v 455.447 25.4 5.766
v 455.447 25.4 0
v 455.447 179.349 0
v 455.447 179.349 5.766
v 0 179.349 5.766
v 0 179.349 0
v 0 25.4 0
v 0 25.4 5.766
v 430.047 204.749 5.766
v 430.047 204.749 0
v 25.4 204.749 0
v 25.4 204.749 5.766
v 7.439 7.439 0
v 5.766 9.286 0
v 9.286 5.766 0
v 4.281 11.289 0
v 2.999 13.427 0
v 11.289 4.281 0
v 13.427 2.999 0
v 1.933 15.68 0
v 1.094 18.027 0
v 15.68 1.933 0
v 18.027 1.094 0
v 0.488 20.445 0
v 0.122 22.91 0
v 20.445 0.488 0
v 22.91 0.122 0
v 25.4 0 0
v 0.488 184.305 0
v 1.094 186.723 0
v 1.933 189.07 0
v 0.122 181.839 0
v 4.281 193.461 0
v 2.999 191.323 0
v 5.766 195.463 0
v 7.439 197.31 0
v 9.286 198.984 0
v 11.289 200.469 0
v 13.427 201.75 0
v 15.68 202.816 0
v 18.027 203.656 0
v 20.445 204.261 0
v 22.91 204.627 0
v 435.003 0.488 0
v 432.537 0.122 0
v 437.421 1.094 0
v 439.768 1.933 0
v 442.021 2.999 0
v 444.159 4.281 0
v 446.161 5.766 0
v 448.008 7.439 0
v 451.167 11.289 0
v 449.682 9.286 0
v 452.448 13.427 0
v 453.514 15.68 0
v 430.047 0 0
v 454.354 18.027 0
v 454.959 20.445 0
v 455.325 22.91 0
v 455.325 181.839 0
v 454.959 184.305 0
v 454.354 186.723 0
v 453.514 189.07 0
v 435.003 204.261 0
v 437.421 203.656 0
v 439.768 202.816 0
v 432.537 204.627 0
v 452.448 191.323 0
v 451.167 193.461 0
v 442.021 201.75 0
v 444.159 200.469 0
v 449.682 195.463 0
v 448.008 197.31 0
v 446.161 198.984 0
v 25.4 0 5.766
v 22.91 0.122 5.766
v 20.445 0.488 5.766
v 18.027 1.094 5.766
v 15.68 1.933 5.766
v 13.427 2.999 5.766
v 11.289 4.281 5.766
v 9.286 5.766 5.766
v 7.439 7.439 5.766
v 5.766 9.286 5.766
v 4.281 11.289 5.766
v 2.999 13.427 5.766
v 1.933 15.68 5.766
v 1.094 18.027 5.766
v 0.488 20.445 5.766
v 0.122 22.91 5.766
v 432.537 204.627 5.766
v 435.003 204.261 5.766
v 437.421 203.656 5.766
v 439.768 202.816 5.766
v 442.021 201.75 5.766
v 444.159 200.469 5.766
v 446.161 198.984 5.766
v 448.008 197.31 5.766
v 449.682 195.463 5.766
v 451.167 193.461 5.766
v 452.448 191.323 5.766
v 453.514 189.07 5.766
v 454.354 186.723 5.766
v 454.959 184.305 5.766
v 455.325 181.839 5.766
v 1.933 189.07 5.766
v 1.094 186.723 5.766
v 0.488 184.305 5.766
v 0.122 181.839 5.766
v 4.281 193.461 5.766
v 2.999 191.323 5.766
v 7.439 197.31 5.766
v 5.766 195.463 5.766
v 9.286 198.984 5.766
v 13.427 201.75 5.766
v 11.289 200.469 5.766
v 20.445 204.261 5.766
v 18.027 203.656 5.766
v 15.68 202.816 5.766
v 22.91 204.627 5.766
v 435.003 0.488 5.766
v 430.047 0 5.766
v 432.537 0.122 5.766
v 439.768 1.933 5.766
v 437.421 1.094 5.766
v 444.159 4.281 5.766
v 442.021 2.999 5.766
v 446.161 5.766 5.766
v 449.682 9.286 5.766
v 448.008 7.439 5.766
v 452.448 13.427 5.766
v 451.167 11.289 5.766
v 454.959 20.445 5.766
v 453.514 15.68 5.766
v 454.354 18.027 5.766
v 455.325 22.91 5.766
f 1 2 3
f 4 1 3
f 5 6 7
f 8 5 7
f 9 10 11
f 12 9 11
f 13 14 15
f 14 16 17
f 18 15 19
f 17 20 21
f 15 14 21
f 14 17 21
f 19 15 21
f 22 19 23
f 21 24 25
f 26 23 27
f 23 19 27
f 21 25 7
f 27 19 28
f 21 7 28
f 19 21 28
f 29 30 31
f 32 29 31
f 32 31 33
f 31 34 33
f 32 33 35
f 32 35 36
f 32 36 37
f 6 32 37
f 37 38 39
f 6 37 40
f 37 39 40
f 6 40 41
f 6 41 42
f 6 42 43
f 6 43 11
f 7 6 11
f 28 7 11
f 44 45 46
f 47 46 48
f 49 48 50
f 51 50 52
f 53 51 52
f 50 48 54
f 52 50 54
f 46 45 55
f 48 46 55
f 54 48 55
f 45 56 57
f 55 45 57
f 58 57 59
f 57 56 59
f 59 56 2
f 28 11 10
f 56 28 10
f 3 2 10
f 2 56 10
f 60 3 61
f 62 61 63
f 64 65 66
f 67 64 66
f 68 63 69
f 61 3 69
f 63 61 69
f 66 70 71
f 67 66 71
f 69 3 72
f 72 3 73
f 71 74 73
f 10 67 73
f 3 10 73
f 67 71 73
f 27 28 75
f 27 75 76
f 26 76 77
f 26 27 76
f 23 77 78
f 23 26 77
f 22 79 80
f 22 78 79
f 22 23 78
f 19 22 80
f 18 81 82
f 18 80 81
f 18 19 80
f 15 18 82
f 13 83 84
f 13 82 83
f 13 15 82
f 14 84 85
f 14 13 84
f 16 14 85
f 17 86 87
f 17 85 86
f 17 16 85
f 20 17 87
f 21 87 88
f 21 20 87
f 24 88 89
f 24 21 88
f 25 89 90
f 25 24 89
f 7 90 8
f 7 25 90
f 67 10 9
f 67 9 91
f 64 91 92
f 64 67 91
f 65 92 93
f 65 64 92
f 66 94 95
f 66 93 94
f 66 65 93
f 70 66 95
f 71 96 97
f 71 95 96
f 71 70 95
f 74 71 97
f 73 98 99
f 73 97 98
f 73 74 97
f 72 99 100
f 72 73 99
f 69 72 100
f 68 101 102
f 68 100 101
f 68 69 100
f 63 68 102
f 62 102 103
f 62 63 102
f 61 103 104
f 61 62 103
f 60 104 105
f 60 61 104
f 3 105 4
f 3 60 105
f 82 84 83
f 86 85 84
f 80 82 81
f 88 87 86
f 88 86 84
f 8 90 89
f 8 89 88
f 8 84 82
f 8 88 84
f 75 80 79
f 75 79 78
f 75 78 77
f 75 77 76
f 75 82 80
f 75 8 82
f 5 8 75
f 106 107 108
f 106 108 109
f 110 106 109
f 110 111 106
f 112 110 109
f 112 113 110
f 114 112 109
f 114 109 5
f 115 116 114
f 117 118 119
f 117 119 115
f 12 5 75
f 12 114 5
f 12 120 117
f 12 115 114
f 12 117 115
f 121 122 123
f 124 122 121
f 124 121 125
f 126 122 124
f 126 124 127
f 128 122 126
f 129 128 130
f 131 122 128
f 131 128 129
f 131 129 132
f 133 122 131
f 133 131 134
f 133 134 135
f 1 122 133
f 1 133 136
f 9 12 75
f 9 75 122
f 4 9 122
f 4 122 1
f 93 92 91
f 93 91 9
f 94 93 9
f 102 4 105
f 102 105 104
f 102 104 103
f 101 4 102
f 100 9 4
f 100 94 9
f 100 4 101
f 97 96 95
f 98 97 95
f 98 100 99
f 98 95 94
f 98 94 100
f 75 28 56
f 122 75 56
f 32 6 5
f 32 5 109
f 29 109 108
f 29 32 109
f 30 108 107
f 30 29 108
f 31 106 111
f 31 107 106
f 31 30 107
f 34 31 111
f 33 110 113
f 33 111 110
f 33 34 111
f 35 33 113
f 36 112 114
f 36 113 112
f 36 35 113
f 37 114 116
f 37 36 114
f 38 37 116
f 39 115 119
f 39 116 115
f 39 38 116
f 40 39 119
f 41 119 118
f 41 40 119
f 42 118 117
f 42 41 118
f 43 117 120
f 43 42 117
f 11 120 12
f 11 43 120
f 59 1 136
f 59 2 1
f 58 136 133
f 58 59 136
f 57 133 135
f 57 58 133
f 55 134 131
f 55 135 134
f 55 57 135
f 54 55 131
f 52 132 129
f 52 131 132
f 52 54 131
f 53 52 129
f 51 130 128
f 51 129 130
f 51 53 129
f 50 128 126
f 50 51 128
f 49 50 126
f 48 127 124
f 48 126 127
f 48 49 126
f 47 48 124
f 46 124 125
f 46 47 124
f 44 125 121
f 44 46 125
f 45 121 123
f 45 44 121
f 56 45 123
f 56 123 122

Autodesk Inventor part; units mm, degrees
ref_plane "YZ Plane" through (0, 0, 0) normal (1, 0, 0) x (0, 1, 0)
ref_plane "XZ Plane" through (0, 0, 0) normal (0, 1, 0) x (-1, 0, 0)
ref_plane "XY Plane" through (0, 0, 0) normal (0, 0, 1) x (1, 0, 0)
sketch "Sketch1" plane through (0, 0, 0) normal (0, 0, 1) x (1, 0, 0)
  line L0 (25.4, 0) -> (430.0474, 0)
  line L1 (455.4474, 25.4) -> (455.4474, 179.3494)
  line L2 (430.0474, 204.7494) -> (25.4, 204.7494)
  line L3 (0, 179.3494) -> (0, 25.4)
  arc A0 (25.4, 204.7494) -> (0, 179.3494) centre (25.4, 179.3494) ccw
  arc A1 (455.4474, 179.3494) -> (430.0474, 204.7494) centre (430.0474, 179.3494) ccw
  arc A2 (430.0474, 0) -> (455.4474, 25.4) centre (430.0474, 25.4) ccw
  arc A3 (0, 25.4) -> (25.4, 0) centre (25.4, 25.4) ccw
  point P0 (0, 0)
  point P1 (455.4474, 204.7494)
  point P2 (0, 204.7494)
  dimension "d0" = 455.4474
  dimension "d1" = 204.7494
  dimension "d2" = 25.4
extrude "Extrusion1" add sketch "Sketch1" along normal blind 5.7658
properties part number "Wind Tunnel Test Section Door Inner" material "Polycarbonate, Clear"
